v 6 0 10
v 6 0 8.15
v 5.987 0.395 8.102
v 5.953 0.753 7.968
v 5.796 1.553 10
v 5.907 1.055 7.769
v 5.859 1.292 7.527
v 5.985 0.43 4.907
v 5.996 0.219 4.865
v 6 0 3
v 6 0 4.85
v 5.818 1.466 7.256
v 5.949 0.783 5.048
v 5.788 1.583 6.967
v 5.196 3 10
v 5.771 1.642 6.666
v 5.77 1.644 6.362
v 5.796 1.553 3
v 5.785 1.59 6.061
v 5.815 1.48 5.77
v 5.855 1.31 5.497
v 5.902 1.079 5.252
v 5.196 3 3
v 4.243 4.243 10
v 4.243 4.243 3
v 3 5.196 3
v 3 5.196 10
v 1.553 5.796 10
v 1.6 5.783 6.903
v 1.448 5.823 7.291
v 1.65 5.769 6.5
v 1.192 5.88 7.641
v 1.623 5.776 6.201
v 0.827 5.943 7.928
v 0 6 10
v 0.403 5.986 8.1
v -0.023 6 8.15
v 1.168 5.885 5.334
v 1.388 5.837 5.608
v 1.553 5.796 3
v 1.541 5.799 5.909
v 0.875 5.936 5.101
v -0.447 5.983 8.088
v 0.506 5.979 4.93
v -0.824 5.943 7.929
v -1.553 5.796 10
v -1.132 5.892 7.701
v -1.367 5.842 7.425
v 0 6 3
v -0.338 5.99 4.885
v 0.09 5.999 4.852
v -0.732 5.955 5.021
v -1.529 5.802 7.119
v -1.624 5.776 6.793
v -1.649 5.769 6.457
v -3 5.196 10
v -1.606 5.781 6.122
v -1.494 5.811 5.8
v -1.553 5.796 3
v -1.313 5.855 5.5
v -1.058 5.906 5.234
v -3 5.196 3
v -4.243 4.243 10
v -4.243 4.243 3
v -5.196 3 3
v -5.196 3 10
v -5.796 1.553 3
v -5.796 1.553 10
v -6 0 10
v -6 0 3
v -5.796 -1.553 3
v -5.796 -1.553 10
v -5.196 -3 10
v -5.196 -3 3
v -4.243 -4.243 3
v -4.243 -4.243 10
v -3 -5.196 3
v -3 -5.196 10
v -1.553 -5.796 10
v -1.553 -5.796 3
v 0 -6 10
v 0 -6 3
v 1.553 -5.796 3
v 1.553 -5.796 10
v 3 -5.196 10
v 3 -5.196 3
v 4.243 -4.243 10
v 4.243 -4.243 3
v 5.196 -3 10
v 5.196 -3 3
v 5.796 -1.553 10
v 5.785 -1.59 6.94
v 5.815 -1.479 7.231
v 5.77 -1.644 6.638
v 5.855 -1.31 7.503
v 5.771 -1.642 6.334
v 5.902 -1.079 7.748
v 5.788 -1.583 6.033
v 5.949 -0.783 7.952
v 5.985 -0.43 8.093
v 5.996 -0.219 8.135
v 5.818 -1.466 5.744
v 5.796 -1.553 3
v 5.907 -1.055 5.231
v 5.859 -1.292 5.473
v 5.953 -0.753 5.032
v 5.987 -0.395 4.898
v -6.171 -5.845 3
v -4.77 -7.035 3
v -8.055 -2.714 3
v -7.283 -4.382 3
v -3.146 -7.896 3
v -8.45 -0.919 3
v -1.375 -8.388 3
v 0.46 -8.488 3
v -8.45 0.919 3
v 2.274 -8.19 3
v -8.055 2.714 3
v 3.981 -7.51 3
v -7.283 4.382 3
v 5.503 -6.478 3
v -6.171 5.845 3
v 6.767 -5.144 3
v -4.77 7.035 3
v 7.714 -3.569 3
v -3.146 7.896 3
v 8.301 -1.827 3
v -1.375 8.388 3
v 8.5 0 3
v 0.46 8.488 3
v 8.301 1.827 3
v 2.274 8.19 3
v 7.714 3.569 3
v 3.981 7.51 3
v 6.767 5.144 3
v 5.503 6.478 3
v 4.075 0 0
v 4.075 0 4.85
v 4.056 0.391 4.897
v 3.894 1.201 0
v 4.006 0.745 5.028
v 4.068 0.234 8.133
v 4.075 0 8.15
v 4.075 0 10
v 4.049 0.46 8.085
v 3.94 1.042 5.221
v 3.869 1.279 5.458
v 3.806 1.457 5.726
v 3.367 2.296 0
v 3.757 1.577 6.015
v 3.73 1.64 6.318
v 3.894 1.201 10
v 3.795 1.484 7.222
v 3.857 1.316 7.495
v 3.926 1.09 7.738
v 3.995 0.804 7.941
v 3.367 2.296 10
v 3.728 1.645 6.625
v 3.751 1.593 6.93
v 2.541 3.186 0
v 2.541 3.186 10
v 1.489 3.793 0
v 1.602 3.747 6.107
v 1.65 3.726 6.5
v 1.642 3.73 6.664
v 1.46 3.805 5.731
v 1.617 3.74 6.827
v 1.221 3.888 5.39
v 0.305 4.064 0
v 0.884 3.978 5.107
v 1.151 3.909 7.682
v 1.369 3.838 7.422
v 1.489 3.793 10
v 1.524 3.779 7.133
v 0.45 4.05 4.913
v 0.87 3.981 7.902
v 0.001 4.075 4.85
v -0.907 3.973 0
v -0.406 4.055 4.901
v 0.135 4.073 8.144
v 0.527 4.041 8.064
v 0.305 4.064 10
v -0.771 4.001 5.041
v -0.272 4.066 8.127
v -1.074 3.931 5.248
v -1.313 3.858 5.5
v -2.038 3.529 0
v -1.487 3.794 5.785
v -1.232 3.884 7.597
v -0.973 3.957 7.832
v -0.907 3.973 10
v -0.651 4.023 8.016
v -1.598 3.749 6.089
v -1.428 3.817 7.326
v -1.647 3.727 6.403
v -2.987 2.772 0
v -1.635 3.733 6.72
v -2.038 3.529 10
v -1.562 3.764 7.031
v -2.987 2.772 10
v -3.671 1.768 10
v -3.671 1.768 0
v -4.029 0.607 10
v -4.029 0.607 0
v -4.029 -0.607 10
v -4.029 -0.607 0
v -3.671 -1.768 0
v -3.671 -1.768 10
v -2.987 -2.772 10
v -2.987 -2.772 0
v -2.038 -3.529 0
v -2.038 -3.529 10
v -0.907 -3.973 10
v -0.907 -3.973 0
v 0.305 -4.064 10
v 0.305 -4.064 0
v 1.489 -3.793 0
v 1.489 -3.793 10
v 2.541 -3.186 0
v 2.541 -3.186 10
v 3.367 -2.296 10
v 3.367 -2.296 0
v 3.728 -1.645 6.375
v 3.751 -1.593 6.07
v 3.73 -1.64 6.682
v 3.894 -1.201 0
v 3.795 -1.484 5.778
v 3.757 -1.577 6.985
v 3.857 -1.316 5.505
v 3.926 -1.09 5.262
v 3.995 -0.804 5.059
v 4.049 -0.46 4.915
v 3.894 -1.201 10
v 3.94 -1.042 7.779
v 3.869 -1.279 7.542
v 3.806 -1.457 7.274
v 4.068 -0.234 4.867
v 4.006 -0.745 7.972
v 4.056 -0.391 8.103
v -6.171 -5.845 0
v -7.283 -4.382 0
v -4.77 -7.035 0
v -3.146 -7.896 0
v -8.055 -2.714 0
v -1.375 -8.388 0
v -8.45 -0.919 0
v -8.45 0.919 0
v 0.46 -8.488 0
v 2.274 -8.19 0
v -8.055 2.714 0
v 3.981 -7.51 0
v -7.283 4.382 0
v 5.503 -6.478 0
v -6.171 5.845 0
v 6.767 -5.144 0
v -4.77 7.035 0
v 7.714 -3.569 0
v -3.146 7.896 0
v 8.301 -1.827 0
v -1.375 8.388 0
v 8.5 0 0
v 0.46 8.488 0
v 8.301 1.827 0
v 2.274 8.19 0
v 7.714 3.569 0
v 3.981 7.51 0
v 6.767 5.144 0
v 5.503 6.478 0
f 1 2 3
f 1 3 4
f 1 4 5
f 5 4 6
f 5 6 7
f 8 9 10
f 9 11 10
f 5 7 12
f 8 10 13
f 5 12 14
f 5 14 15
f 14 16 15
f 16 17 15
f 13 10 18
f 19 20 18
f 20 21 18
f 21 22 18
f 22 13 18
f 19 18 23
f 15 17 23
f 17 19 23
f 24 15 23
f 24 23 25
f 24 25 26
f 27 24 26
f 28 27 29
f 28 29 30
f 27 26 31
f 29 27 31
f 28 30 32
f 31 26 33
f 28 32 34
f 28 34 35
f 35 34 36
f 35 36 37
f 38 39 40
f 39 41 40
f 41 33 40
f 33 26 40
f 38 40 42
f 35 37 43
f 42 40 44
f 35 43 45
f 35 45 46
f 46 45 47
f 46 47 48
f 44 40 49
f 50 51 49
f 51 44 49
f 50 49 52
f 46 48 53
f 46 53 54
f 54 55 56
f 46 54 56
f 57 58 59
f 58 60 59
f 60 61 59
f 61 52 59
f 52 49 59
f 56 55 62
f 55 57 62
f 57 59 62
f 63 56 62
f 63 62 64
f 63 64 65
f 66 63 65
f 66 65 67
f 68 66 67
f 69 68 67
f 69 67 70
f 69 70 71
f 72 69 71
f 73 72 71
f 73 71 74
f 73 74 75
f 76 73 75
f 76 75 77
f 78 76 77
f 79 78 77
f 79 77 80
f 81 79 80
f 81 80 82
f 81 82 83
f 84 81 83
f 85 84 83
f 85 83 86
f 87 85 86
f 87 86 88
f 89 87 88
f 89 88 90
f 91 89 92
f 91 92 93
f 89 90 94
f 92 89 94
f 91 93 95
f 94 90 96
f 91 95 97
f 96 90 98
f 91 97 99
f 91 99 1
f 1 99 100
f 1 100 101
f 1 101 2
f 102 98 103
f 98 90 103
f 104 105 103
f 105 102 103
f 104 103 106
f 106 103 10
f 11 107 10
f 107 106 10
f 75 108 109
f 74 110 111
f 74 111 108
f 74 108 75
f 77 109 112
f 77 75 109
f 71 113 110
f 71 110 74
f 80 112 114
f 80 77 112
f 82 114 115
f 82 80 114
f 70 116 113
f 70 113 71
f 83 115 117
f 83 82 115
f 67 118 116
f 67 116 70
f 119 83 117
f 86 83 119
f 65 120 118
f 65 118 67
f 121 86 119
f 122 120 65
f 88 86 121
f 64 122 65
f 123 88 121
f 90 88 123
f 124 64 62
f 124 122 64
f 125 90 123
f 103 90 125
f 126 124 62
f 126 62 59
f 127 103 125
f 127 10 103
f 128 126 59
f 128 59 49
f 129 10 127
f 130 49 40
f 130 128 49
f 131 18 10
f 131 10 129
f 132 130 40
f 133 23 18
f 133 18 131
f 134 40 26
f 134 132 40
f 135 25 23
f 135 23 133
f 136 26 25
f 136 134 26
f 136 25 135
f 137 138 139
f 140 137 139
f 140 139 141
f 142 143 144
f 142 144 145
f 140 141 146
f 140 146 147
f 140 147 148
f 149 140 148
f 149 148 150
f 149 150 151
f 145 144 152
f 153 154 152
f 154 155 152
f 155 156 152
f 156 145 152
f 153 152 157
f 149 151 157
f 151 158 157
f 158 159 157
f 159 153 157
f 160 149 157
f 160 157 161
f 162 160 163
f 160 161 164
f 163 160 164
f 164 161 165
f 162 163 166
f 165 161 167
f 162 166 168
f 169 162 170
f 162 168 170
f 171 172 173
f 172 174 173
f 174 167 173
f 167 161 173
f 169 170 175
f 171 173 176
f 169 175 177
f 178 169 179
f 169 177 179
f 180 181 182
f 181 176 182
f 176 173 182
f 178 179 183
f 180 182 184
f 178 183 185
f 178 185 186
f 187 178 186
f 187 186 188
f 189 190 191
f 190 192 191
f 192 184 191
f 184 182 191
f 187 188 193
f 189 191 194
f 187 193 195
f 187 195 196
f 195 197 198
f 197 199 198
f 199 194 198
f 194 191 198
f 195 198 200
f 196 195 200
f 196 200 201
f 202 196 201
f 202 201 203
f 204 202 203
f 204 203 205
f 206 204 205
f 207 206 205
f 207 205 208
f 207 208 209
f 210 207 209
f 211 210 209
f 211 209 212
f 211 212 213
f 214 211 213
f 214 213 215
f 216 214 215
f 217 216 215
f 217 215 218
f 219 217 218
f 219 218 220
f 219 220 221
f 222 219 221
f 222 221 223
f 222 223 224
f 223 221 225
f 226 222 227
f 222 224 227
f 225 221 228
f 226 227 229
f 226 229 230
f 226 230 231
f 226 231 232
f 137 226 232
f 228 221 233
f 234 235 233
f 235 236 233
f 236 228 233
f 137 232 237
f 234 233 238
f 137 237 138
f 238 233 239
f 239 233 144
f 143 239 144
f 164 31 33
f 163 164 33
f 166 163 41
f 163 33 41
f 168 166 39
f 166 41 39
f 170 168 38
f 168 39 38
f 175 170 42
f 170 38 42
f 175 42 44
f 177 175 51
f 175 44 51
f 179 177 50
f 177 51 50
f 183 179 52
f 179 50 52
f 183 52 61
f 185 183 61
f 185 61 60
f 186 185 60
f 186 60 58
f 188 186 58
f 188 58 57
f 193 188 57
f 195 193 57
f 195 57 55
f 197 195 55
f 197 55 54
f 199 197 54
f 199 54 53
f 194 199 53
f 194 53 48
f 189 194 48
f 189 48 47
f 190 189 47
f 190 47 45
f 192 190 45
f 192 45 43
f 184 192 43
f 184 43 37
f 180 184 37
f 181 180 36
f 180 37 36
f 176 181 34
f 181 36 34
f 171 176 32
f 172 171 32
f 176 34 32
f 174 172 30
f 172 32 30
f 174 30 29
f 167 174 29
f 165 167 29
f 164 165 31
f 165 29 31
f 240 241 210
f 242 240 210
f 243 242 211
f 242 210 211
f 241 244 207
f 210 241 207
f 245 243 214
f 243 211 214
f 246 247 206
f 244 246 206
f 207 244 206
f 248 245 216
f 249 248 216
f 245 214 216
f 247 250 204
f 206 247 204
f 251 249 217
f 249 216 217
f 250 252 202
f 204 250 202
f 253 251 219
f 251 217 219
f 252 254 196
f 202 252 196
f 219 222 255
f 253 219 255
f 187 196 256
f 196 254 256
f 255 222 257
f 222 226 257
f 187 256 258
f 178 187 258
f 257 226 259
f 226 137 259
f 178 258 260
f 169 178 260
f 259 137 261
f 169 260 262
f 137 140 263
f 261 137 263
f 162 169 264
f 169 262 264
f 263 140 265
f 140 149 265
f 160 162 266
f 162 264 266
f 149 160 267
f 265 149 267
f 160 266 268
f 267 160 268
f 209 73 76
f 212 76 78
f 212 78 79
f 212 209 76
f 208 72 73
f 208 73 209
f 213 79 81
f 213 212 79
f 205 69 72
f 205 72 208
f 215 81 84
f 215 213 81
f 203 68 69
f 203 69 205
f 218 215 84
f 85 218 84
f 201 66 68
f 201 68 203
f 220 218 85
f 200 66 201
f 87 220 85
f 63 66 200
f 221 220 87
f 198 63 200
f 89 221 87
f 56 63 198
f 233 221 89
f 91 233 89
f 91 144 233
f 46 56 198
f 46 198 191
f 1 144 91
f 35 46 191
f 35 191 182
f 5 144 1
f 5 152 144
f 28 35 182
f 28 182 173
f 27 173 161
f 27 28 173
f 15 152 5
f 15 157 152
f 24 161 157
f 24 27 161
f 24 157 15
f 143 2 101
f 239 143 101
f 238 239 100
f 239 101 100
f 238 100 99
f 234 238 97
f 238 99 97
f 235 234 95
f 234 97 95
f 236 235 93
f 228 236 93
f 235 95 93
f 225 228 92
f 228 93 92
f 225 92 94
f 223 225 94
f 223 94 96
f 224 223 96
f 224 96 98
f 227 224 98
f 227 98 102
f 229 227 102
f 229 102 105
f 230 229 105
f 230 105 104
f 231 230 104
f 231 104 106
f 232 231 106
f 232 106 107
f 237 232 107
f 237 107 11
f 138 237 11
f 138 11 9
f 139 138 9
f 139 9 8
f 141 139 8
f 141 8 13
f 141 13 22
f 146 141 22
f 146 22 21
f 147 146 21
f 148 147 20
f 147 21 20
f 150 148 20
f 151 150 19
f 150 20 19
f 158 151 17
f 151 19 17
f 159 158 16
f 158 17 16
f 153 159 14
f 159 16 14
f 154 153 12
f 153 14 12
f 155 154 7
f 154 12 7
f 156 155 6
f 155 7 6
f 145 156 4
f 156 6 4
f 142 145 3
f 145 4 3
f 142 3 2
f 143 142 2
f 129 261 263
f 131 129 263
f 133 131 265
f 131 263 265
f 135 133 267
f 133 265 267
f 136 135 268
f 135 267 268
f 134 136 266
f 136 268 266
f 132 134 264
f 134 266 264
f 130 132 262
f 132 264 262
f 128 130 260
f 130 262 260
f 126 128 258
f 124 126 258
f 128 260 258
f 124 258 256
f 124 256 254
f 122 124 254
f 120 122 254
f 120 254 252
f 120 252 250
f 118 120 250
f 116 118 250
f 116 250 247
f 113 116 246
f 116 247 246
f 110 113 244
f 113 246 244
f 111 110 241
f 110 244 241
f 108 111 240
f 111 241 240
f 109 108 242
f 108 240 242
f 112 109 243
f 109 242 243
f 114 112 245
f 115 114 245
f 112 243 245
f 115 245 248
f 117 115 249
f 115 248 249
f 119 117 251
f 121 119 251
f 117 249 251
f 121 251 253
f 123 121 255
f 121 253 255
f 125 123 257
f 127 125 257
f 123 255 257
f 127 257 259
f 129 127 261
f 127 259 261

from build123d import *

# Parameters (mm, degrees)
SKETCH_2_R                       = 8.5
EXTRUDE_2_DEPTH                  = 3
SKETCH_3_R                       = 6
EXTRUDE_3_DEPTH                  = 7
SKETCH_4_R                       = 4.075
CUT_EXTRUDE_1_DEPTH              = 16.636495771
HOLE_WIZARD_M4_3_REACH           = 20.021
HOLE_WIZARD_M4_3_BORE_R          = 1.65
HOLE_WIZARD_M4_3_ON_FACE_2_REACH = 20.021
HOLE_WIZARD_M4_3_BORE_2_R        = 1.65


with BuildPart() as part:
    # 스케치2 → 보스-돌출2 (new body)
    with BuildSketch(Plane.XY):
        Circle(SKETCH_2_R)
    extrude(amount=EXTRUDE_2_DEPTH)

    # 스케치3 → 보스-돌출3 (add)
    with BuildSketch(Plane.XY.offset(3)):
        Circle(SKETCH_3_R)
    extrude(amount=EXTRUDE_3_DEPTH)

    # 스케치4 → 컷-돌출1 (cut, through all)
    with BuildSketch(Plane.XY.offset(10)):
        Circle(SKETCH_4_R)
    extrude(amount=-CUT_EXTRUDE_1_DEPTH, mode=Mode.SUBTRACT)

    # M4 나사 구멍3 bore (on position points) → M4 나사 구멍3 (cut, up to next)
    with BuildSketch(Plane(origin=(0, 6, 6.5), x_dir=(1, 0, 0), z_dir=(0, 1, 0)), mode=Mode.PRIVATE) as hole_wizard_m4_3_sk1:
        Circle(HOLE_WIZARD_M4_3_BORE_R)
    hole_wizard_m4_3_tool1 = extrude(hole_wizard_m4_3_sk1.sketch, amount=-HOLE_WIZARD_M4_3_REACH, mode=Mode.PRIVATE) & part.part
    add(hole_wizard_m4_3_tool1.solids().sort_by_distance((0, 6, 6.5))[0], mode=Mode.SUBTRACT)

    # M4 나사 구멍3 bore 2 (on position points) → M4 나사 구멍3 on face 2 (cut, up to next)
    with BuildSketch(Plane(origin=(6, 0, 6.5), x_dir=(0, 0, 1), z_dir=(1, 0, 0)), mode=Mode.PRIVATE) as hole_wizard_m4_3_on_face_2_sk1:
        Circle(HOLE_WIZARD_M4_3_BORE_2_R)
    hole_wizard_m4_3_on_face_2_tool1 = extrude(hole_wizard_m4_3_on_face_2_sk1.sketch, amount=-HOLE_WIZARD_M4_3_ON_FACE_2_REACH, mode=Mode.PRIVATE) & part.part
    add(hole_wizard_m4_3_on_face_2_tool1.solids().sort_by_distance((6, 0, 6.5))[0], mode=Mode.SUBTRACT)


solid = part.part
